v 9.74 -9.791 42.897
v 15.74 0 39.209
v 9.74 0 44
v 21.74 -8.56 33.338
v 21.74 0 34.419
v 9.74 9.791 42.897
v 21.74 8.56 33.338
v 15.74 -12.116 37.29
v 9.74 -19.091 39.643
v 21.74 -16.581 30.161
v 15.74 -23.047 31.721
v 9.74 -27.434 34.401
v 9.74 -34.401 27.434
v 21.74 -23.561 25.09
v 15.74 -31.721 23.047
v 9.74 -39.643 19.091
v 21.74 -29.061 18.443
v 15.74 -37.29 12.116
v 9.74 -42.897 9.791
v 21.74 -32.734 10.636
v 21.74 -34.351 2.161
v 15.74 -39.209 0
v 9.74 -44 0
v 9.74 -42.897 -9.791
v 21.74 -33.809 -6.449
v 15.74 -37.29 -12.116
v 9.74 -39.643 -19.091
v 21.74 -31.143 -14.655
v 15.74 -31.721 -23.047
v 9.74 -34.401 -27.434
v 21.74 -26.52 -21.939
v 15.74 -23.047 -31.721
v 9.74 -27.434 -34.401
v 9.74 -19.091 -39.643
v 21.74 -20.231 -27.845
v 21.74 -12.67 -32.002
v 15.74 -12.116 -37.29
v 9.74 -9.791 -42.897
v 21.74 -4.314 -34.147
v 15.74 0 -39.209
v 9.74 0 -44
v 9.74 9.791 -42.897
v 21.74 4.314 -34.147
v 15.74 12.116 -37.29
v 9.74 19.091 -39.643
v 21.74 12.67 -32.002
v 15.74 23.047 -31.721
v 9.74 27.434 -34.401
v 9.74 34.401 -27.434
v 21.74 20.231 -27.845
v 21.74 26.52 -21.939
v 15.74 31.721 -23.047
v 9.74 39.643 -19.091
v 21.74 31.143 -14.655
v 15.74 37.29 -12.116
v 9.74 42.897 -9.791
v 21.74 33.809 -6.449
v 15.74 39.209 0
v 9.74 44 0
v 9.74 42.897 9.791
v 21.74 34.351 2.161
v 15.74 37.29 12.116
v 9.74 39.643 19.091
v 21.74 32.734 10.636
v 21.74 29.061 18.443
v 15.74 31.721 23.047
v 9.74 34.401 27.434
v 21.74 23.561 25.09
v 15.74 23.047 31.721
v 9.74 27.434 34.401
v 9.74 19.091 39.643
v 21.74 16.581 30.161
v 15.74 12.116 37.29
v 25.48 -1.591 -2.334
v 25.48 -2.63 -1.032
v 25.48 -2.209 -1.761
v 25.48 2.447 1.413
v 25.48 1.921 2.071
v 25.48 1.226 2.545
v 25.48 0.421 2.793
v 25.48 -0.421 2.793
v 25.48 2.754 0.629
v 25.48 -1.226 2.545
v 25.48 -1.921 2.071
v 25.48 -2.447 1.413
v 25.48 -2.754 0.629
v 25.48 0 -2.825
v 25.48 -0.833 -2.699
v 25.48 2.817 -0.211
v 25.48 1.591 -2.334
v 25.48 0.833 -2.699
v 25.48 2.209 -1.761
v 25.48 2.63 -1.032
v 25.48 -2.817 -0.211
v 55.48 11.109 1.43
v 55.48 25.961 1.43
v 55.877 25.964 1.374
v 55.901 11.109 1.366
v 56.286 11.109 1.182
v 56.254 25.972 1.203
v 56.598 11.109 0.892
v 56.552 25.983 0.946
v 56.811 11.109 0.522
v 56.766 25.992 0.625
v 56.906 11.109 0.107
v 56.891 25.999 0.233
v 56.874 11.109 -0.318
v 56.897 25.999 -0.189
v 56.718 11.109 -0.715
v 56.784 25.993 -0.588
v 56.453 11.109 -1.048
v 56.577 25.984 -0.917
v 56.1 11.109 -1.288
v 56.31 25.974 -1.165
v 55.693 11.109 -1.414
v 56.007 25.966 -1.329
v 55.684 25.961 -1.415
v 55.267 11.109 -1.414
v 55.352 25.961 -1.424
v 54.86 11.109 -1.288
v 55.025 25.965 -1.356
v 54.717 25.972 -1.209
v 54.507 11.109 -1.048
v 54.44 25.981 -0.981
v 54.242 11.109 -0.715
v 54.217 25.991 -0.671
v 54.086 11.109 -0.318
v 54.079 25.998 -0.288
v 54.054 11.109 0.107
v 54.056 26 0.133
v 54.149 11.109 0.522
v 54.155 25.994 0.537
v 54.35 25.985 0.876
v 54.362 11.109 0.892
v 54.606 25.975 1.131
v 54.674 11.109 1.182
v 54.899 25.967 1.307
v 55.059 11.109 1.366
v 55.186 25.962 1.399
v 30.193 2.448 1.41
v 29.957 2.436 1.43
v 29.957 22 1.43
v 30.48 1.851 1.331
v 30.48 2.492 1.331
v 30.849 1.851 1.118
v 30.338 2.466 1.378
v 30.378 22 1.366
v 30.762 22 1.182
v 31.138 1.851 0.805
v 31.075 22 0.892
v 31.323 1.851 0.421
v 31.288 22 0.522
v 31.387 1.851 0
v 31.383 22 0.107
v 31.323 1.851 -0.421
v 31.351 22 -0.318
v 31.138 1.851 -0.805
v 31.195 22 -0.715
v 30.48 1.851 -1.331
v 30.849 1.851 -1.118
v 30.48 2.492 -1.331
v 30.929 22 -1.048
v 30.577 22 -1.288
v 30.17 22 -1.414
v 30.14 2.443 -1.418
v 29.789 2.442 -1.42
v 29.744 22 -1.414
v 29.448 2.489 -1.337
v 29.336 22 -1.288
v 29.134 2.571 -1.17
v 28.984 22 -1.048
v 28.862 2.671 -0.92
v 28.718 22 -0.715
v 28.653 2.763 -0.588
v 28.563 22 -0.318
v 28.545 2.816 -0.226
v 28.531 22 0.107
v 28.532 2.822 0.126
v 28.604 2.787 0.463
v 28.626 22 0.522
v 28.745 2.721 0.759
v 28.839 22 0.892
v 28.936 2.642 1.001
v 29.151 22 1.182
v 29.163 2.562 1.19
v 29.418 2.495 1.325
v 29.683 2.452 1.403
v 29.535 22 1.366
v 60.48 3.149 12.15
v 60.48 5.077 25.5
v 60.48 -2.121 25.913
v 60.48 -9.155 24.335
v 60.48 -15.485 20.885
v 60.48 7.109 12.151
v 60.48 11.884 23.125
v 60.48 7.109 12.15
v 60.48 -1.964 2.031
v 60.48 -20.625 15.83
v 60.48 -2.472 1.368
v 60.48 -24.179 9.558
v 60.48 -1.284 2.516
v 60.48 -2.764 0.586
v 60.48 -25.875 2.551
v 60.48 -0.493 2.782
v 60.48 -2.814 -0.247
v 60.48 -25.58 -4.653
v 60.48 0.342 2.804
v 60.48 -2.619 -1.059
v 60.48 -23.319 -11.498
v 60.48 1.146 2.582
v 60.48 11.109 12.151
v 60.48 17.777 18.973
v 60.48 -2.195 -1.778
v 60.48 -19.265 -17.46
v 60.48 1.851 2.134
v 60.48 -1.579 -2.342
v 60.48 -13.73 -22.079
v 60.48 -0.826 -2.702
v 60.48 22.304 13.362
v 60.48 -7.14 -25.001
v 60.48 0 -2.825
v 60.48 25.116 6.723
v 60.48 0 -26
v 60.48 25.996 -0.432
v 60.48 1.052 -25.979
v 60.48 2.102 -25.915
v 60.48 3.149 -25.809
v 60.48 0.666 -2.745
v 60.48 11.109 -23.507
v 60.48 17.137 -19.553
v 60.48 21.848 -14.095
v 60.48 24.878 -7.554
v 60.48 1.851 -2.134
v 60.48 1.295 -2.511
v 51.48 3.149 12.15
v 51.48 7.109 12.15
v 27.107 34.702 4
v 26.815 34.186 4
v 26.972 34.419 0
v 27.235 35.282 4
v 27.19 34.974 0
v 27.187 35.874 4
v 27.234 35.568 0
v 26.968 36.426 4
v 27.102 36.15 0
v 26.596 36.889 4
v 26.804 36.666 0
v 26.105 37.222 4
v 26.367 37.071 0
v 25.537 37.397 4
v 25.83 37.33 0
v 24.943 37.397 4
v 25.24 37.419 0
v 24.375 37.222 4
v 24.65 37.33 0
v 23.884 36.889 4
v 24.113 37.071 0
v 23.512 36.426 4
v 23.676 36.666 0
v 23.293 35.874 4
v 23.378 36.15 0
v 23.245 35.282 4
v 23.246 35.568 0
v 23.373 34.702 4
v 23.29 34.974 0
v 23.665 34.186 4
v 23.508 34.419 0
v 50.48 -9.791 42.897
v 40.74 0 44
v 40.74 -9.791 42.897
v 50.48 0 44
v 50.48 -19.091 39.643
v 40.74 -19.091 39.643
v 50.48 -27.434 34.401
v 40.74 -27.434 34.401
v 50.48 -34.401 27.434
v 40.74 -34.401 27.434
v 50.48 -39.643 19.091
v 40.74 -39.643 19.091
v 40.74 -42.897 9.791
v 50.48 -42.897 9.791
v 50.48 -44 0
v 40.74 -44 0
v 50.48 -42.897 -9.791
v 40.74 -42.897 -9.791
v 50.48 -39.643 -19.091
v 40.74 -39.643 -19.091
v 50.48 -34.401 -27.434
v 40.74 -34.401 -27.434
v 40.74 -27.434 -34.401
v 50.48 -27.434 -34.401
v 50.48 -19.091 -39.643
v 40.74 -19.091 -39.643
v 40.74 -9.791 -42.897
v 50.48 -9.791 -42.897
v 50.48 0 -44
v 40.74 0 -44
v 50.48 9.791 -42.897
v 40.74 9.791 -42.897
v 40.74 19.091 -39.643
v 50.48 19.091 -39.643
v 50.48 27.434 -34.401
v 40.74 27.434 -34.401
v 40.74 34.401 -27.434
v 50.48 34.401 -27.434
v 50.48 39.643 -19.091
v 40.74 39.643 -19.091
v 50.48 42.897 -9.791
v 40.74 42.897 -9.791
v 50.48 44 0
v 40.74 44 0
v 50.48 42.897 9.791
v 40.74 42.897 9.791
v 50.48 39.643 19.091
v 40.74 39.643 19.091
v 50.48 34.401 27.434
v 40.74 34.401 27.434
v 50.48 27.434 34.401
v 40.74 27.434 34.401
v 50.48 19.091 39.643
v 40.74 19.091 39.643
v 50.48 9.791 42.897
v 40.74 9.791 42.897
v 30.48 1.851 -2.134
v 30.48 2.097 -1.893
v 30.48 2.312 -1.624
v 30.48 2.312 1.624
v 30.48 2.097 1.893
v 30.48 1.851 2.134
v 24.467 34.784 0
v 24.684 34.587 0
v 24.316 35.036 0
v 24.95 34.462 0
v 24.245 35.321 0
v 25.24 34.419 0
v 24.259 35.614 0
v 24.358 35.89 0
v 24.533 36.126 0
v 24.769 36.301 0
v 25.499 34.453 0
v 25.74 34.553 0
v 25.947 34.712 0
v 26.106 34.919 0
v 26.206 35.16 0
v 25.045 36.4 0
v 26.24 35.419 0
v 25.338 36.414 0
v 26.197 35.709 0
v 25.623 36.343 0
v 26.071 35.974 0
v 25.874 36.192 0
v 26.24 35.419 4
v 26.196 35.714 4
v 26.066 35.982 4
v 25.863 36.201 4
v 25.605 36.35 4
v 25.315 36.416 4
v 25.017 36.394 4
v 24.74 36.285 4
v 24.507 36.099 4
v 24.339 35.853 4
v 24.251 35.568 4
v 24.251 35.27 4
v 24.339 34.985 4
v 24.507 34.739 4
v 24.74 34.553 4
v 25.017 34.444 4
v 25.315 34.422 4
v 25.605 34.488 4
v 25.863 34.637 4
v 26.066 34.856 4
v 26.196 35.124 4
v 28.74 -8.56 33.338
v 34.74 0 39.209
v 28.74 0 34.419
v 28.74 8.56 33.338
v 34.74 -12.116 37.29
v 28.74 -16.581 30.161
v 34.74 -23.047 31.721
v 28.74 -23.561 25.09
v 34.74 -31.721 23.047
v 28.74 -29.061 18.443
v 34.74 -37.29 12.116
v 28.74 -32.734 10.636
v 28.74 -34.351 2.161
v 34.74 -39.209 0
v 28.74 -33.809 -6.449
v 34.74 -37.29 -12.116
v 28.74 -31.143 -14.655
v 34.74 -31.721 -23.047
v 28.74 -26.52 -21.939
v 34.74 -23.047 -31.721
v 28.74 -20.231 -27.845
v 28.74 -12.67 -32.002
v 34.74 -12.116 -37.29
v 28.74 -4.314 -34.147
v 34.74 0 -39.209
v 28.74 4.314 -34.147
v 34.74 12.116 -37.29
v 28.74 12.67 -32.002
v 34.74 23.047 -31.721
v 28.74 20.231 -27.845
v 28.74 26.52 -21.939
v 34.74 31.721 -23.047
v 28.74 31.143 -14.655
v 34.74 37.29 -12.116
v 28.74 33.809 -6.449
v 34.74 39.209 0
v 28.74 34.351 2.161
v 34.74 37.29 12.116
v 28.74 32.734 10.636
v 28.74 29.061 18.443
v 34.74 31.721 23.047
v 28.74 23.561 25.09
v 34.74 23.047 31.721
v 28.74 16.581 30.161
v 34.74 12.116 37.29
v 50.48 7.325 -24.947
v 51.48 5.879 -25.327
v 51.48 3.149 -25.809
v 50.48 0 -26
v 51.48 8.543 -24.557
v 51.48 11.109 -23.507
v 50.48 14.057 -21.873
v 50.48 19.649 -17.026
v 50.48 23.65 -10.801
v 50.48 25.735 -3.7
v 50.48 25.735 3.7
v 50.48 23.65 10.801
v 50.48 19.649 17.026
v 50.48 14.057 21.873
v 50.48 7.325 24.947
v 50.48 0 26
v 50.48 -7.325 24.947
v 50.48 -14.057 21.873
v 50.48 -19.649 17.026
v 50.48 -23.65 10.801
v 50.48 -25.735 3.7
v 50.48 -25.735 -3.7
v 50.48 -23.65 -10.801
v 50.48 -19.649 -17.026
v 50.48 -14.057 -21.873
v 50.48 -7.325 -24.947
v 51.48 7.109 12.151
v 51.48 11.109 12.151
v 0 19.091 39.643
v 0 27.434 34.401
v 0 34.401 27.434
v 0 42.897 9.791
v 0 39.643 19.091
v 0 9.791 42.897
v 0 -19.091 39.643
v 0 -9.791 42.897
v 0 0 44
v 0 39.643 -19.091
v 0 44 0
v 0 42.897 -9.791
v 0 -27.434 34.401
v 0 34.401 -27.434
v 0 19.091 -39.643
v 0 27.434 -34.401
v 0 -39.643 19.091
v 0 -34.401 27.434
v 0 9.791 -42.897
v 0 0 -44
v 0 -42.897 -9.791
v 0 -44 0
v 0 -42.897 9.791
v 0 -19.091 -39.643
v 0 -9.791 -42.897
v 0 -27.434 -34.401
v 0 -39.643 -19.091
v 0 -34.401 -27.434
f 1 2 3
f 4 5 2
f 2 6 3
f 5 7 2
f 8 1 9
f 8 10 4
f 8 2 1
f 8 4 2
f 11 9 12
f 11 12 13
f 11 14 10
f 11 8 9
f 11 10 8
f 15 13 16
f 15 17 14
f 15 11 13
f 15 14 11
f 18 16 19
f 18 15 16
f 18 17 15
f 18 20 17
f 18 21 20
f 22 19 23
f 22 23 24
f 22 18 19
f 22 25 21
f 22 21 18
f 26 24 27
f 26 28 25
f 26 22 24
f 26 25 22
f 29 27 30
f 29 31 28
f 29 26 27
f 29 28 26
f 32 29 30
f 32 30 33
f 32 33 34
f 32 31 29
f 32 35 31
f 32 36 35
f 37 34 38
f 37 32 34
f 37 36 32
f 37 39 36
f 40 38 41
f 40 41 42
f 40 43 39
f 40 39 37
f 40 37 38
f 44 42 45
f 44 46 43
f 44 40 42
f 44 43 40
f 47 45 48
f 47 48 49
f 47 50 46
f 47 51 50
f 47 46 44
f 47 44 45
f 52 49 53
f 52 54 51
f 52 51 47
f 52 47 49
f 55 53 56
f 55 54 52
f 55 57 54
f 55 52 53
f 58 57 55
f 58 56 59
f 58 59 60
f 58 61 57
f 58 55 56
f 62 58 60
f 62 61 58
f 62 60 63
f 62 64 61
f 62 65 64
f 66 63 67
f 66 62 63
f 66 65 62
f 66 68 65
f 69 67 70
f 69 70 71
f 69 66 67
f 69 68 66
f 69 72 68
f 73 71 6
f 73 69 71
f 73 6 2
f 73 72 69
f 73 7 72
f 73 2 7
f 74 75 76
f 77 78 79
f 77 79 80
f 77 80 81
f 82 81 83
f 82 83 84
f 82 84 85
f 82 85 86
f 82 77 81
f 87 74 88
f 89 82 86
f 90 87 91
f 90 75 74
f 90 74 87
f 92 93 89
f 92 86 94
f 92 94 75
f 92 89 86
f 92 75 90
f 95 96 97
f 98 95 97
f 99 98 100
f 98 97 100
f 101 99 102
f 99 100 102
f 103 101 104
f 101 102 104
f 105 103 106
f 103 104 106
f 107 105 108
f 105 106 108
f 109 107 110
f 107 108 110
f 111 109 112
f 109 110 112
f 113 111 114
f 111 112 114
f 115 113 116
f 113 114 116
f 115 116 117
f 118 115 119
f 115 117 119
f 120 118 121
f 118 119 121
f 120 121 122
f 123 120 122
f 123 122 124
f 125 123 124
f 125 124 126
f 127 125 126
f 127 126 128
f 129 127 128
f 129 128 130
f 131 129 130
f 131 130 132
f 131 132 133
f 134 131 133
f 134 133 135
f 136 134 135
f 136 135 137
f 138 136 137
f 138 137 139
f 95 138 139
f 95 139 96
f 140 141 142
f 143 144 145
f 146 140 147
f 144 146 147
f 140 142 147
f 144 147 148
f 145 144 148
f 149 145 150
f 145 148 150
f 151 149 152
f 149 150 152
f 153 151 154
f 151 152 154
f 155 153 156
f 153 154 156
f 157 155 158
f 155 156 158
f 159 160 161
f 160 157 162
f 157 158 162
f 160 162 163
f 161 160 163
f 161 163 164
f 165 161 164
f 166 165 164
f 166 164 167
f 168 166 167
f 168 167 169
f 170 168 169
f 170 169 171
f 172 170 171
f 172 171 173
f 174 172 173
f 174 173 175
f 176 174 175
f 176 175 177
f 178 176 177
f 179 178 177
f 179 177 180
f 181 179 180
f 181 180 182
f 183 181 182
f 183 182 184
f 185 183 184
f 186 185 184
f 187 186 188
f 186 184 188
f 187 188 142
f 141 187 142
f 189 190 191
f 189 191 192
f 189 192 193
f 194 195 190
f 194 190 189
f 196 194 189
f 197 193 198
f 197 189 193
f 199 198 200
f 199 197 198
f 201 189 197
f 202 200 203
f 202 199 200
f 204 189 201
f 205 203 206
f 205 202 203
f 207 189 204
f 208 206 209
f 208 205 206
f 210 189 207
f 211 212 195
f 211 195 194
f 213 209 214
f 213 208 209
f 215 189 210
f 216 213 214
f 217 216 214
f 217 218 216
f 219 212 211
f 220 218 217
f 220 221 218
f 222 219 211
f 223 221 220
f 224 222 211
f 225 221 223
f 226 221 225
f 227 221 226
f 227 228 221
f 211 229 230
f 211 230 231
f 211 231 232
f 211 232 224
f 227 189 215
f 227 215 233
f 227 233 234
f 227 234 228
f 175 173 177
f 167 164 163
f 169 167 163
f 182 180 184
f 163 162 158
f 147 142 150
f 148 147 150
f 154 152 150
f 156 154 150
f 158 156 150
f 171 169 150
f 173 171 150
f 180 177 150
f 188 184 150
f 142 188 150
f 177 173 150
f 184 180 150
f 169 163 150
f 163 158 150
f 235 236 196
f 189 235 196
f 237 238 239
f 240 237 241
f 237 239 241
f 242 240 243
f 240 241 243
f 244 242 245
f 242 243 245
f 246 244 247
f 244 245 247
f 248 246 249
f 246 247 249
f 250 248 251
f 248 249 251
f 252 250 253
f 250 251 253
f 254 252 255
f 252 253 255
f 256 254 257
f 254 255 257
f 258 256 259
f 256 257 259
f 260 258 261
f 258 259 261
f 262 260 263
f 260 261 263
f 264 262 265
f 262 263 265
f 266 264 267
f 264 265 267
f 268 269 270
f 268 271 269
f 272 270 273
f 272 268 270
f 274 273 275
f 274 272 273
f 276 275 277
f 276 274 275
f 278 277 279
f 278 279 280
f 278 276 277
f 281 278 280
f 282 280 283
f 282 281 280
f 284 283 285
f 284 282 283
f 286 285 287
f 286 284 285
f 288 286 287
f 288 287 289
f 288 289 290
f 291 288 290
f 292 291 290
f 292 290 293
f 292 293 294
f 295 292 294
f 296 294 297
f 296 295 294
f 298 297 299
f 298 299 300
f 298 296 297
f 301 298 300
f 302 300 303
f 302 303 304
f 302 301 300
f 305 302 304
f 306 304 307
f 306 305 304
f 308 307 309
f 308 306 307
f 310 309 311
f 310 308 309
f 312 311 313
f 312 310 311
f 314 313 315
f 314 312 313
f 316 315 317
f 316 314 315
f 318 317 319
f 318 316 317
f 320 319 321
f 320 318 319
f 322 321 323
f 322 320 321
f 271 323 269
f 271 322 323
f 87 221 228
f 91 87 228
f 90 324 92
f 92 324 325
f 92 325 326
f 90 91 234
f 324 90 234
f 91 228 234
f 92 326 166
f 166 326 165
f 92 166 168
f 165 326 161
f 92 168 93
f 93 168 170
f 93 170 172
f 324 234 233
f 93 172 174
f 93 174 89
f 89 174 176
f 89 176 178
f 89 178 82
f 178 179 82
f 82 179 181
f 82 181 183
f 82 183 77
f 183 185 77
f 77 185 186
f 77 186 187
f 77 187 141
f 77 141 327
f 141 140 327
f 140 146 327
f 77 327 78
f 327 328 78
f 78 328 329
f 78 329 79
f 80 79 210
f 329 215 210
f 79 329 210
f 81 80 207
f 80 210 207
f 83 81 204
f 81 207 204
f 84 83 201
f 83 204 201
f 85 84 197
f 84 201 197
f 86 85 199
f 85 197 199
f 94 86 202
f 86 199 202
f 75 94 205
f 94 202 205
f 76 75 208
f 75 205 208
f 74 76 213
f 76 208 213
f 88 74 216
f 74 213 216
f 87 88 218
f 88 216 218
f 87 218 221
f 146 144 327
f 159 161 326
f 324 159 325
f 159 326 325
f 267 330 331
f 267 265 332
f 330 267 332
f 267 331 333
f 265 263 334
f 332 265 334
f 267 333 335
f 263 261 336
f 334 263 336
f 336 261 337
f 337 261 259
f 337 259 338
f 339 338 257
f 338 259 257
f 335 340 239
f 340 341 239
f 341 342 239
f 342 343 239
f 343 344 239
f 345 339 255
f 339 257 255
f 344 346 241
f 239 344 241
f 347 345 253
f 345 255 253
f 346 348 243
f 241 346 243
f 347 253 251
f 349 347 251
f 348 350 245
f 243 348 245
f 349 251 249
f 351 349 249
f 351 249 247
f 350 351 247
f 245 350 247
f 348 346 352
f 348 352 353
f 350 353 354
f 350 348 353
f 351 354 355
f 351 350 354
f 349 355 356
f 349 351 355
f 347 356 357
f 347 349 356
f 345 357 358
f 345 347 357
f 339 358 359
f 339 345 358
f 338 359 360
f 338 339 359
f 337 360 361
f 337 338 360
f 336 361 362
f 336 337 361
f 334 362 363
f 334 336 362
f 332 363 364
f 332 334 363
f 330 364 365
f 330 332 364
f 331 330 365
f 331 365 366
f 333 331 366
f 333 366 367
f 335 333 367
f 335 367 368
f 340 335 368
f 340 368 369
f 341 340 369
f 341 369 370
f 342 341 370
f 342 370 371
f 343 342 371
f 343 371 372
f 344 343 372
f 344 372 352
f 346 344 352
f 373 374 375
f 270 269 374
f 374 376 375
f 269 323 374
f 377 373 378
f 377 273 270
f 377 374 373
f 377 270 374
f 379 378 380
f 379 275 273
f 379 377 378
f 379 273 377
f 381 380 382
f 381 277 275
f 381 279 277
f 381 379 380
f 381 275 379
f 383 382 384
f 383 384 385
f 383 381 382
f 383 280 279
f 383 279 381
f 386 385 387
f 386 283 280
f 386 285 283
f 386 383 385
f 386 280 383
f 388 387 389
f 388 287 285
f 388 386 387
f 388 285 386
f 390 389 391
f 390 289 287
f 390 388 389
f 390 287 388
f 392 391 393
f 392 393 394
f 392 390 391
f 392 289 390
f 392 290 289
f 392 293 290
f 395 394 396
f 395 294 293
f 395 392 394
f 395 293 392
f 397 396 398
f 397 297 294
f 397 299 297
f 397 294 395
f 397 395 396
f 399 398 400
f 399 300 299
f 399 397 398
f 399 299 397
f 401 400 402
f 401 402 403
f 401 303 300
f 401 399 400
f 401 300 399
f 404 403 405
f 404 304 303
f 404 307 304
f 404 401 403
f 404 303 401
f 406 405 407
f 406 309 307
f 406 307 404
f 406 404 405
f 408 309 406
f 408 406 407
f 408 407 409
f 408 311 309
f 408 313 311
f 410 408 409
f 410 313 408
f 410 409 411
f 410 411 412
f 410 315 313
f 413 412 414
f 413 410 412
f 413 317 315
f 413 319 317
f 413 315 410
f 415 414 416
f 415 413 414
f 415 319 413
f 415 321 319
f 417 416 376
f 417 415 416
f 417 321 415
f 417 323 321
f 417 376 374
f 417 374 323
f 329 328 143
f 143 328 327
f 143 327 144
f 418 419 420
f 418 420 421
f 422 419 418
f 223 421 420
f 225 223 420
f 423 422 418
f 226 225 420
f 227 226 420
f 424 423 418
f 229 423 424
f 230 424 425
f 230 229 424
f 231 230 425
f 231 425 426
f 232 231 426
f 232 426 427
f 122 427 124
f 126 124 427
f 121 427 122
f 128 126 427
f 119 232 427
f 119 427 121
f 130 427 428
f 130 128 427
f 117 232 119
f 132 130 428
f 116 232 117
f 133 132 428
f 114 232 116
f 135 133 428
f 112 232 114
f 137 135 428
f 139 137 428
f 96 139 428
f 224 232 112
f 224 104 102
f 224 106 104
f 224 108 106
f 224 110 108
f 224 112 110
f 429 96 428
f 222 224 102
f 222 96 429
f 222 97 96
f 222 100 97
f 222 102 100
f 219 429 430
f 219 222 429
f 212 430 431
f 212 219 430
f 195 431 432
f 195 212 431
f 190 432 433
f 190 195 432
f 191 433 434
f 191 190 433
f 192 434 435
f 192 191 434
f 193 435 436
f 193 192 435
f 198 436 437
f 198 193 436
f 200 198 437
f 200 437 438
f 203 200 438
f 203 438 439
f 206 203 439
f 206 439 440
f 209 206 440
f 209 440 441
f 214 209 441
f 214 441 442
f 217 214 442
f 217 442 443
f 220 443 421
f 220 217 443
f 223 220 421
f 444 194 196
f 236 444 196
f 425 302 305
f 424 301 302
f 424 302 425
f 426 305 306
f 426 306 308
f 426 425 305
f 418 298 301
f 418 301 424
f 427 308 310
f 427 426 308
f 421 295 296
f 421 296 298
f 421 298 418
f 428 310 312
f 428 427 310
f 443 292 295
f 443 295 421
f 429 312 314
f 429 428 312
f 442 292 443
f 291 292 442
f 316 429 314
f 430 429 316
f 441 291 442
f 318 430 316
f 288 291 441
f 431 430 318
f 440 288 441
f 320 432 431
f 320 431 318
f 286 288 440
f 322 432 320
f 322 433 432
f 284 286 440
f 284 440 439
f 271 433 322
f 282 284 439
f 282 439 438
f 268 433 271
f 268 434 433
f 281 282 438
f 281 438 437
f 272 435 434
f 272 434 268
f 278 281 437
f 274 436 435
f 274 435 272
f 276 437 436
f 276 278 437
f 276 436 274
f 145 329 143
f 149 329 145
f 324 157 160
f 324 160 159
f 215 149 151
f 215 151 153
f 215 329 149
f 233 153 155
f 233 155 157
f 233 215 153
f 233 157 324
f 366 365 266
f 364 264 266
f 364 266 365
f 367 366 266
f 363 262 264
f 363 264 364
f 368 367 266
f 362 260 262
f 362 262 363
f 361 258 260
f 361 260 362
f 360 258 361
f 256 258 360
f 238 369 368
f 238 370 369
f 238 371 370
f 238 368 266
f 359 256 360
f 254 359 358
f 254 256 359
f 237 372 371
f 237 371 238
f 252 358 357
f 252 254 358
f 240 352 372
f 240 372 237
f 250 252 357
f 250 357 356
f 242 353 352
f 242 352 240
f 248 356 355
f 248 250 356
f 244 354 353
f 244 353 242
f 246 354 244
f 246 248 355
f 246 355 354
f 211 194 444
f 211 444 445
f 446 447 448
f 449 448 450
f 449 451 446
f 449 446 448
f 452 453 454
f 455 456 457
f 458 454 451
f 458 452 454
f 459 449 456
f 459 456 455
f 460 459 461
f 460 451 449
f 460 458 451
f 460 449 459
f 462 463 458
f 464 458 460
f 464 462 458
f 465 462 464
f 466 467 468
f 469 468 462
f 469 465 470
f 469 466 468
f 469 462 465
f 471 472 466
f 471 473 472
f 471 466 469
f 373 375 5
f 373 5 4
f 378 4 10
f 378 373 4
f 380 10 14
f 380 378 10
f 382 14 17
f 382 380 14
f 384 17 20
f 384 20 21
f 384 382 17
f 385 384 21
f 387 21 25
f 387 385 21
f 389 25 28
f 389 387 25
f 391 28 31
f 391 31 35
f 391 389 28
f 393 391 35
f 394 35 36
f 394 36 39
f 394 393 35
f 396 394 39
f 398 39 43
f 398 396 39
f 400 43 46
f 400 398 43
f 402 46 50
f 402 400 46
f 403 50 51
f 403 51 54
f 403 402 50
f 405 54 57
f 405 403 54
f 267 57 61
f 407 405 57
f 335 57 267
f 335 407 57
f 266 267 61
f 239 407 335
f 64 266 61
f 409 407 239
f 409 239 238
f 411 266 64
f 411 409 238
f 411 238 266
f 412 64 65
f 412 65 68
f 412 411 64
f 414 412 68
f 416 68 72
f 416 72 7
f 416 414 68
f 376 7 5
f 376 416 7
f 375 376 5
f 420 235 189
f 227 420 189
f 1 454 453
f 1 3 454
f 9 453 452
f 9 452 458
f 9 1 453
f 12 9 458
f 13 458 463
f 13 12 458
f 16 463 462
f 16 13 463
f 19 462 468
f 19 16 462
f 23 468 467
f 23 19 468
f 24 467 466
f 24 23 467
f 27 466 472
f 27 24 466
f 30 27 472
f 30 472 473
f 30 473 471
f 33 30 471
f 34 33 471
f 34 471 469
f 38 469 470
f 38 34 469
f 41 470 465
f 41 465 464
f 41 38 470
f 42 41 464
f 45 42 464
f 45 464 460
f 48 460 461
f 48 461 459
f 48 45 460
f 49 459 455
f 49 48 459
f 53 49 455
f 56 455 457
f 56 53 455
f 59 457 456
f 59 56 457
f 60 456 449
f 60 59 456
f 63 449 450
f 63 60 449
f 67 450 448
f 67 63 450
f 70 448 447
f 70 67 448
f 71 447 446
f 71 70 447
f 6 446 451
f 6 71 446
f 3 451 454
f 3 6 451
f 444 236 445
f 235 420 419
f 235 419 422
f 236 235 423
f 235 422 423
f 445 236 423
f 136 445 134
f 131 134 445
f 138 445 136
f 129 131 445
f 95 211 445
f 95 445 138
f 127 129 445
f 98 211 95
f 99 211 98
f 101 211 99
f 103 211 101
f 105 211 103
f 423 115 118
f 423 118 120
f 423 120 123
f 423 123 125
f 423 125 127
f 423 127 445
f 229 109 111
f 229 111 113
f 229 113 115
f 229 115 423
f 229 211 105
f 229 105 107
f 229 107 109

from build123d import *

# Parameters (mm, degrees)
SKETCH_3_R                = 2.825
CUT_EXTRUDE_2_DEPTH       = 35
SKETCH_16_W               = 5.008881277
SKETCH_16_H               = 1
EXTRUDE_2_DEPTH           = 30
SKETCH_19_W               = 0.959066555
SKETCH_19_H               = 0.511502163
EXTRUDE_3_DEPTH           = 30
SKETCH_24_W               = 45.827715764
SKETCH_24_H               = 4
CUT_EXTRUDE_8_DEPTH       = 9
SKETCH_25_R               = 1.43
CUT_EXTRUDE_9_DEPTH       = 22
SKETCH_27_R               = 2
SKETCH_27_R_2             = 1
EXTRUDE_2_2_DEPTH         = 4
SKETCH_28_R               = 1.43
CUT_EXTRUDE_11_DEPTH      = 25
CUT_EXTRUDE_12_DEPTH      = 12.15
CUT_EXTRUDE_12_DEPTH_BACK = 35
SKETCH_29_W               = 9
SKETCH_29_H               = 3.960677992
SKETCH_30_R               = 47
SKETCH_30_R_2             = 26
CUT_EXTRUDE_1_DEPTH       = 10


with BuildPart() as part:
    # 草圖1 → 旋轉1 (revolve)
    with BuildSketch(Plane.XY, mode=Mode.PRIVATE) as revolve_1_sk:
        Polygon((0, 0), (0, 44), (9.74, 44), (21.74, 34.418858447), (28.74, 34.418858447), (40.74, 44), (50.48, 44), (50.48, 34.418858447), (60.48, 34.418858447), (60.48, 0), align=None)
    revolve(revolve_1_sk.sketch.rotate(Axis((-743.15639781, 0, 0), (1, 0, 0)), 90), axis=Axis((-743.15639781, 0, 0), (1, 0, 0)))

    # 草圖3 → 除料-伸長2 (cut)
    with BuildSketch(Plane(origin=(60.48, 0, 0), x_dir=(0, 0, -1), z_dir=(1, 0, 0))):
        Circle(SKETCH_3_R)
    extrude(amount=-CUT_EXTRUDE_2_DEPTH, mode=Mode.SUBTRACT)

    # 草圖16 → Extrude 2 (add)
    with BuildSketch(Plane(origin=(60.48, 0, 0), x_dir=(0, 0, -1), z_dir=(1, 0, 0))):
        with Locations((-0.105543204, 2.350977924)):
            Rectangle(SKETCH_16_W, SKETCH_16_H)
    extrude(amount=-EXTRUDE_2_DEPTH)

    # 草圖19 → 填料-伸長3 (add)
    with BuildSketch(Plane(origin=(60.48, 0, 0), x_dir=(0, 0, -1), z_dir=(1, 0, 0))):
        with Locations((-0.084116996, 2.673942601)):
            Rectangle(SKETCH_19_W, SKETCH_19_H)
    extrude(amount=-EXTRUDE_3_DEPTH)

    # 草圖24 → 除料-伸長8 (cut)
    with BuildSketch(Plane(origin=(60.48, 0, 0), x_dir=(0, 0, -1), z_dir=(1, 0, 0))):
        with Locations((10.762797737, 9.109197083)):
            Rectangle(SKETCH_24_W, SKETCH_24_H)
    extrude(amount=-CUT_EXTRUDE_8_DEPTH, mode=Mode.SUBTRACT)

    # 草圖25 → 除料-伸長9 (cut)
    with BuildSketch(Plane(origin=(0, 22, 0), x_dir=(1, 0, 0), z_dir=(0, 1, 0))):
        with Locations(Location((29.956679037, 0, 0), (0, 0, 270))):
            Circle(SKETCH_25_R)
    extrude(amount=-CUT_EXTRUDE_9_DEPTH, mode=Mode.SUBTRACT)

    # 草圖27 → Extrude 2 2 (add)
    with BuildSketch(Plane.XY):
        with Locations((25.24, 35.418858447)):
            Circle(SKETCH_27_R)
        with Locations((25.24, 35.418858447)):
            Circle(SKETCH_27_R_2, mode=Mode.SUBTRACT)
    extrude(amount=EXTRUDE_2_2_DEPTH)

    # 草圖28 → 除料-伸長11 (cut)
    with BuildSketch(Plane(origin=(0, 35, 0), x_dir=(1, 0, 0), z_dir=(0, 1, 0))):
        with Locations(Location((55.48, 0, 0), (0, 0, 270))):
            Circle(SKETCH_28_R)
    extrude(amount=-CUT_EXTRUDE_11_DEPTH, mode=Mode.SUBTRACT)

    # 草圖29 → 除料-伸長12 (cut, two sides: drawn at the far end of the back side and taken through both)
    with BuildSketch(Plane.XY.offset(-CUT_EXTRUDE_12_DEPTH_BACK)):
        with Locations((55.98, 5.128858087)):
            Rectangle(SKETCH_29_W, SKETCH_29_H)
    extrude(amount=CUT_EXTRUDE_12_DEPTH + CUT_EXTRUDE_12_DEPTH_BACK, mode=Mode.SUBTRACT)

    # 草圖30 → 除料-伸長-薄件1 (cut)
    with BuildSketch(Plane(origin=(60.48, 0, 0), x_dir=(0, 0, -1), z_dir=(1, 0, 0))):
        Circle(SKETCH_30_R)
        Circle(SKETCH_30_R_2, mode=Mode.SUBTRACT)
    extrude(amount=-CUT_EXTRUDE_1_DEPTH, mode=Mode.SUBTRACT)


solid = part.part
